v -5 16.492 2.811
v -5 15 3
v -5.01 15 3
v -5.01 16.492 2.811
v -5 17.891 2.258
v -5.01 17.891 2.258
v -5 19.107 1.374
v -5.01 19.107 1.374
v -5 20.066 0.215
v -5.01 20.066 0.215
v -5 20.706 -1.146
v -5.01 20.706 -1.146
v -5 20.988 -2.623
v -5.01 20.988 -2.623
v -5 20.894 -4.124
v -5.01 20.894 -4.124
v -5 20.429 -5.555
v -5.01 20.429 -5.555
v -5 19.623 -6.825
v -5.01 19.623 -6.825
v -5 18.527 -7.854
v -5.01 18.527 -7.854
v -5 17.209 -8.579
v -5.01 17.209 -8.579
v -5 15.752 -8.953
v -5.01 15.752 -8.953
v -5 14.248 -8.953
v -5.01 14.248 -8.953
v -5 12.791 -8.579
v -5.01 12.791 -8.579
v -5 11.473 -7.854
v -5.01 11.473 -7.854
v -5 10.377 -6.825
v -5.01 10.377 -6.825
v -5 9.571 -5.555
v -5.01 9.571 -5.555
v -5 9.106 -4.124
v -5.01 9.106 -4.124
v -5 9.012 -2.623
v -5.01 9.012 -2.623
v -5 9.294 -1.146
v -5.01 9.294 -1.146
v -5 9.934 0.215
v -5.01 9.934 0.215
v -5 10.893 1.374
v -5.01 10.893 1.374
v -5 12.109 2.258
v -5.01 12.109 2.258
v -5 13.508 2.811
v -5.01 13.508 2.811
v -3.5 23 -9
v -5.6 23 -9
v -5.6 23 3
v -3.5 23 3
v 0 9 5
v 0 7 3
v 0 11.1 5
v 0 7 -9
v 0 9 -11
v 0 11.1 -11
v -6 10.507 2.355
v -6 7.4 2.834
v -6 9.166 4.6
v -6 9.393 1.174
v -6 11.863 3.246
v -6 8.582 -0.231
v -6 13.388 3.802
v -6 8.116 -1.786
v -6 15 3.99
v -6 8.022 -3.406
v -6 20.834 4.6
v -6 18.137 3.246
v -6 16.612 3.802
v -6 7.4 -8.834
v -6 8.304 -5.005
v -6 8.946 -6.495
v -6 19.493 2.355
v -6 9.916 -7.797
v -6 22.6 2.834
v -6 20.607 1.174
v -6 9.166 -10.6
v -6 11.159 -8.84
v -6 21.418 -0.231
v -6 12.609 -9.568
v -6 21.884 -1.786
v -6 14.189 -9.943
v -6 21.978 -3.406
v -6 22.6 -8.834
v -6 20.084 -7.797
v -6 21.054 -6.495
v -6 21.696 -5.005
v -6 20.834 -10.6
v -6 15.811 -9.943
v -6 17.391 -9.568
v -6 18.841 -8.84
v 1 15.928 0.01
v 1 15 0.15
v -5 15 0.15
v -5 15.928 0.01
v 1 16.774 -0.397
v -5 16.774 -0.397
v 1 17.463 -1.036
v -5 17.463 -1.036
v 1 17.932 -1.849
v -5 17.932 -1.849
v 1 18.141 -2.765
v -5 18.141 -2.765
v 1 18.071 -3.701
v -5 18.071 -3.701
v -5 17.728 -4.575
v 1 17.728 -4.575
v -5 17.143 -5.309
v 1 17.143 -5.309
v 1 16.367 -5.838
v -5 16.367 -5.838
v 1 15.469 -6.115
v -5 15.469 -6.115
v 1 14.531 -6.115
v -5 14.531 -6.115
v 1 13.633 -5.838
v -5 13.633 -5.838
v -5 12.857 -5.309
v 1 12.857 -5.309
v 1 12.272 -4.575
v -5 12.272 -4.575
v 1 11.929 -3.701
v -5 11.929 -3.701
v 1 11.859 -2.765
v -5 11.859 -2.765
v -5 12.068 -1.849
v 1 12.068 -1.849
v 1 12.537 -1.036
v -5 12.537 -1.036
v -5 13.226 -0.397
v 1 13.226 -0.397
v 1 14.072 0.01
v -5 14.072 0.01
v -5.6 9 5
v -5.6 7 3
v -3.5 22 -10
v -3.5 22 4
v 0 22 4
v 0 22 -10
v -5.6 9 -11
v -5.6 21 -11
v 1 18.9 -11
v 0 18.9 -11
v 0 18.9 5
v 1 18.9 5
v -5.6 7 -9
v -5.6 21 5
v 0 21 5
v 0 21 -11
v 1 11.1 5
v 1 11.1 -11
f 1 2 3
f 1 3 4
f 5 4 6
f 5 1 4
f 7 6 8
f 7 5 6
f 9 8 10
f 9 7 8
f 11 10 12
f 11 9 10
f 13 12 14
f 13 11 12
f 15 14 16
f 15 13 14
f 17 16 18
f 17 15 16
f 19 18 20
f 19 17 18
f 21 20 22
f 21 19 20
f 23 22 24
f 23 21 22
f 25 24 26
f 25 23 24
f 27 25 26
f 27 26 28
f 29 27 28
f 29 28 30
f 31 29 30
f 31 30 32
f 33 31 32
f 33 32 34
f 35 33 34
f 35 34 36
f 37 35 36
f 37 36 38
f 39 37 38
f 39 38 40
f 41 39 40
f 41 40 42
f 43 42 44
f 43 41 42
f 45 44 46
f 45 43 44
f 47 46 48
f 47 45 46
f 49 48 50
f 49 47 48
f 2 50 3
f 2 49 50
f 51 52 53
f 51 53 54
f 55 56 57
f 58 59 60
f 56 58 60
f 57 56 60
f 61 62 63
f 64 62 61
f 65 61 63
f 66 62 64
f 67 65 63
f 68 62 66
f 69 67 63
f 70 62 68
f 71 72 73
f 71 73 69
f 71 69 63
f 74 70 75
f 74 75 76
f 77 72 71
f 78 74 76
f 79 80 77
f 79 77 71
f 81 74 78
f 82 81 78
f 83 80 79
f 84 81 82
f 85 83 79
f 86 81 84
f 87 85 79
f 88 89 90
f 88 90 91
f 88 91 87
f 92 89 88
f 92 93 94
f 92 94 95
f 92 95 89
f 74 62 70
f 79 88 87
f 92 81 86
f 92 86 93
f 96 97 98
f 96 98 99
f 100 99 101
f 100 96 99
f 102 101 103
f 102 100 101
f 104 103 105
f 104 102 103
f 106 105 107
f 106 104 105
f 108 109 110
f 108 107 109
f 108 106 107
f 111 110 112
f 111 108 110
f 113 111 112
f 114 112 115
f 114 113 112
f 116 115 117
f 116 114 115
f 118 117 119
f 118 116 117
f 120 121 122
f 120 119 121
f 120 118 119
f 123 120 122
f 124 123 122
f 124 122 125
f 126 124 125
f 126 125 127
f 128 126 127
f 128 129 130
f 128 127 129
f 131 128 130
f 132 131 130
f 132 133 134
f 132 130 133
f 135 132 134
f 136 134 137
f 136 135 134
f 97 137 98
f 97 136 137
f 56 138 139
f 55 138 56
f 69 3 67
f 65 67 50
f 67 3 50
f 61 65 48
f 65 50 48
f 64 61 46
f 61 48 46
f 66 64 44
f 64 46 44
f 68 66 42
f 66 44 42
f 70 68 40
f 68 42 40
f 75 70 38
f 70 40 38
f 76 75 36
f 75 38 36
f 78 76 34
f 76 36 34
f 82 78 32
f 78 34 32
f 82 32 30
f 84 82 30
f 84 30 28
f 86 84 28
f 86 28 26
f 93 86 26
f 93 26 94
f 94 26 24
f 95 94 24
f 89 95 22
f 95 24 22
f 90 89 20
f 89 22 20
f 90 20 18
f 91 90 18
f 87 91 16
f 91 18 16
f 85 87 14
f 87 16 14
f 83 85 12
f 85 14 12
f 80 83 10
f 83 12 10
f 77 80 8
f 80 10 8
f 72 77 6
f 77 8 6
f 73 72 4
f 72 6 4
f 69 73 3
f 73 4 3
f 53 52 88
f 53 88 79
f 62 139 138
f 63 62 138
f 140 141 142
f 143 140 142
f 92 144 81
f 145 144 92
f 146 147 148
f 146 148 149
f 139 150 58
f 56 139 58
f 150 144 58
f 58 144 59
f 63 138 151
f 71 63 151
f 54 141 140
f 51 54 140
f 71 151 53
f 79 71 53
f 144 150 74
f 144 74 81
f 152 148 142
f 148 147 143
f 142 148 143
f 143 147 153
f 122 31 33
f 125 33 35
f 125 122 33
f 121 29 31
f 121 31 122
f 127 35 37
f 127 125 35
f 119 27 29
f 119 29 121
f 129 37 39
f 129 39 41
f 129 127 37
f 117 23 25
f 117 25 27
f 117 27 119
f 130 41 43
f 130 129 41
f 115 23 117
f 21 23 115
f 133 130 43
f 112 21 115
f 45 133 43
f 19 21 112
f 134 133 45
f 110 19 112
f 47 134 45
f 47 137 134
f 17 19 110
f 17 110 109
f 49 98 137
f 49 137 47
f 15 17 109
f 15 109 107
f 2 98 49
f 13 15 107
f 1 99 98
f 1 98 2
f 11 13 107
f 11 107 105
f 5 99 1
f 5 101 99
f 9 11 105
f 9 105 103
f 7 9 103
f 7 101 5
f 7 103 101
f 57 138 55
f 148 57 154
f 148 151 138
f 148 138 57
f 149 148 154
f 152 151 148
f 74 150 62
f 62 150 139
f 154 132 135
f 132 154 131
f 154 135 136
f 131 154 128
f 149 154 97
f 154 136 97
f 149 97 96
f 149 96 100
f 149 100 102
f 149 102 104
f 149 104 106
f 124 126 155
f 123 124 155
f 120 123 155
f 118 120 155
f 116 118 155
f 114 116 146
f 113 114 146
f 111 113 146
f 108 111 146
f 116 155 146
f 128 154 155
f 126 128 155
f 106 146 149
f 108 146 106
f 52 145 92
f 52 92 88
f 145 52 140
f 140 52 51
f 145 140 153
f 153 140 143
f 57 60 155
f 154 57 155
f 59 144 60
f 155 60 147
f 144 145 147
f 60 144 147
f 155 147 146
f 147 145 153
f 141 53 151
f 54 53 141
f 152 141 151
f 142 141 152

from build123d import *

# Parameters (mm, degrees)
BOX033_W              = 10
BOX033_H              = 10
BOX033_DEPTH          = 18
CYLINDER011_R         = 3.15
CYLINDER011_DEPTH     = 10
CYLINDER012_R         = 6
CYLINDER012_DEPTH     = 10
BOX026_W              = 6
BOX026_H              = 16
BOX026_DEPTH          = 16
BOX027_W              = 1
BOX027_H              = 7.8
BOX027_DEPTH          = 16
CHAMFER006006011_SIZE = 0.99
CHAMFER006006012_SIZE = 2
CHAMFER006006013_SIZE = 0.4


with BuildPart() as cube032:
    # Box033 → Box033 (new body)
    with BuildSketch(Plane(origin=(-3.5, 22, -12.5), x_dir=(1, 0, 0), z_dir=(0, 0, 1))):
        with Locations((5, 5)):
            Rectangle(BOX033_W, BOX033_H)
    extrude(amount=BOX033_DEPTH)


with BuildPart() as cylinder011:
    # Cylinder011 → Cylinder011 (new body)
    with BuildSketch(Plane(origin=(2, 15, 8), x_dir=(0, 0, 1), z_dir=(-1, 0, 0))):
        Circle(CYLINDER011_R)
    extrude(amount=CYLINDER011_DEPTH)


with BuildPart() as fusion005:
    # Cylinder012 → Cylinder012 (new body)
    with BuildSketch(Plane(origin=(-5, 15, 8), x_dir=(0, 0, 1), z_dir=(-1, 0, 0))):
        Circle(CYLINDER012_R)
    extrude(amount=CYLINDER012_DEPTH)

    # Fusion005: union Cylinder011
    add(cylinder011.part)


with BuildPart() as cube025:
    # Box026 → Box026 (new body)
    with BuildSketch(Plane(origin=(-6, 7, 0), x_dir=(1, 0, 0), z_dir=(0, 0, 1))):
        with Locations((3, 8)):
            Rectangle(BOX026_W, BOX026_H)
    extrude(amount=BOX026_DEPTH)


with BuildPart() as cut002004005004:
    # Box027 → Box027 (new body)
    with BuildSketch(Plane(origin=(0, 11.1, 0), x_dir=(1, 0, 0), z_dir=(0, 0, 1))):
        with Locations((0.5, 3.9)):
            Rectangle(BOX027_W, BOX027_H)
    extrude(amount=BOX027_DEPTH)

    # Fusion006: union Cube025
    add(cube025.part)

    # Cut002004002: cut Fusion005
    add(fusion005.part, mode=Mode.SUBTRACT)

    # Chamfer006006011
    chamfer006006011_edges = [cut002004005004.edges().sort_by_distance(p)[0] for p in [
        (-6, 15, 2),
    ]]
    chamfer(chamfer006006011_edges, length=CHAMFER006006011_SIZE)

    # Chamfer006006012
    chamfer006006012_edges = [cut002004005004.edges().sort_by_distance(p)[0] for p in [
        (-3, 7, 0),
        (-3, 7, 16),
        (-3, 23, 16),
        (-3, 23, 0),
    ]]
    chamfer(chamfer006006012_edges, length=CHAMFER006006012_SIZE)

    # Chamfer006006013
    chamfer006006013_edges = [cut002004005004.edges().sort_by_distance(p)[0] for p in [
        (-6, 7, 8),
        (-6, 8, 1),
        (-6, 15, 0),
        (-6, 22, 1),
        (-6, 23, 8),
        (-6, 22, 15),
        (-6, 15, 16),
        (-6, 8, 15),
    ]]
    chamfer(chamfer006006013_edges, length=CHAMFER006006013_SIZE)


with BuildPart() as cut002004005004_1:
    # Chamfer006006013 placement: moved
    add(cut002004005004.part.moved(Location((0, 0, -11))))

    # Cut002004005004: cut Cube032
    add(cube032.part, mode=Mode.SUBTRACT)


solid = cut002004005004_1.part
